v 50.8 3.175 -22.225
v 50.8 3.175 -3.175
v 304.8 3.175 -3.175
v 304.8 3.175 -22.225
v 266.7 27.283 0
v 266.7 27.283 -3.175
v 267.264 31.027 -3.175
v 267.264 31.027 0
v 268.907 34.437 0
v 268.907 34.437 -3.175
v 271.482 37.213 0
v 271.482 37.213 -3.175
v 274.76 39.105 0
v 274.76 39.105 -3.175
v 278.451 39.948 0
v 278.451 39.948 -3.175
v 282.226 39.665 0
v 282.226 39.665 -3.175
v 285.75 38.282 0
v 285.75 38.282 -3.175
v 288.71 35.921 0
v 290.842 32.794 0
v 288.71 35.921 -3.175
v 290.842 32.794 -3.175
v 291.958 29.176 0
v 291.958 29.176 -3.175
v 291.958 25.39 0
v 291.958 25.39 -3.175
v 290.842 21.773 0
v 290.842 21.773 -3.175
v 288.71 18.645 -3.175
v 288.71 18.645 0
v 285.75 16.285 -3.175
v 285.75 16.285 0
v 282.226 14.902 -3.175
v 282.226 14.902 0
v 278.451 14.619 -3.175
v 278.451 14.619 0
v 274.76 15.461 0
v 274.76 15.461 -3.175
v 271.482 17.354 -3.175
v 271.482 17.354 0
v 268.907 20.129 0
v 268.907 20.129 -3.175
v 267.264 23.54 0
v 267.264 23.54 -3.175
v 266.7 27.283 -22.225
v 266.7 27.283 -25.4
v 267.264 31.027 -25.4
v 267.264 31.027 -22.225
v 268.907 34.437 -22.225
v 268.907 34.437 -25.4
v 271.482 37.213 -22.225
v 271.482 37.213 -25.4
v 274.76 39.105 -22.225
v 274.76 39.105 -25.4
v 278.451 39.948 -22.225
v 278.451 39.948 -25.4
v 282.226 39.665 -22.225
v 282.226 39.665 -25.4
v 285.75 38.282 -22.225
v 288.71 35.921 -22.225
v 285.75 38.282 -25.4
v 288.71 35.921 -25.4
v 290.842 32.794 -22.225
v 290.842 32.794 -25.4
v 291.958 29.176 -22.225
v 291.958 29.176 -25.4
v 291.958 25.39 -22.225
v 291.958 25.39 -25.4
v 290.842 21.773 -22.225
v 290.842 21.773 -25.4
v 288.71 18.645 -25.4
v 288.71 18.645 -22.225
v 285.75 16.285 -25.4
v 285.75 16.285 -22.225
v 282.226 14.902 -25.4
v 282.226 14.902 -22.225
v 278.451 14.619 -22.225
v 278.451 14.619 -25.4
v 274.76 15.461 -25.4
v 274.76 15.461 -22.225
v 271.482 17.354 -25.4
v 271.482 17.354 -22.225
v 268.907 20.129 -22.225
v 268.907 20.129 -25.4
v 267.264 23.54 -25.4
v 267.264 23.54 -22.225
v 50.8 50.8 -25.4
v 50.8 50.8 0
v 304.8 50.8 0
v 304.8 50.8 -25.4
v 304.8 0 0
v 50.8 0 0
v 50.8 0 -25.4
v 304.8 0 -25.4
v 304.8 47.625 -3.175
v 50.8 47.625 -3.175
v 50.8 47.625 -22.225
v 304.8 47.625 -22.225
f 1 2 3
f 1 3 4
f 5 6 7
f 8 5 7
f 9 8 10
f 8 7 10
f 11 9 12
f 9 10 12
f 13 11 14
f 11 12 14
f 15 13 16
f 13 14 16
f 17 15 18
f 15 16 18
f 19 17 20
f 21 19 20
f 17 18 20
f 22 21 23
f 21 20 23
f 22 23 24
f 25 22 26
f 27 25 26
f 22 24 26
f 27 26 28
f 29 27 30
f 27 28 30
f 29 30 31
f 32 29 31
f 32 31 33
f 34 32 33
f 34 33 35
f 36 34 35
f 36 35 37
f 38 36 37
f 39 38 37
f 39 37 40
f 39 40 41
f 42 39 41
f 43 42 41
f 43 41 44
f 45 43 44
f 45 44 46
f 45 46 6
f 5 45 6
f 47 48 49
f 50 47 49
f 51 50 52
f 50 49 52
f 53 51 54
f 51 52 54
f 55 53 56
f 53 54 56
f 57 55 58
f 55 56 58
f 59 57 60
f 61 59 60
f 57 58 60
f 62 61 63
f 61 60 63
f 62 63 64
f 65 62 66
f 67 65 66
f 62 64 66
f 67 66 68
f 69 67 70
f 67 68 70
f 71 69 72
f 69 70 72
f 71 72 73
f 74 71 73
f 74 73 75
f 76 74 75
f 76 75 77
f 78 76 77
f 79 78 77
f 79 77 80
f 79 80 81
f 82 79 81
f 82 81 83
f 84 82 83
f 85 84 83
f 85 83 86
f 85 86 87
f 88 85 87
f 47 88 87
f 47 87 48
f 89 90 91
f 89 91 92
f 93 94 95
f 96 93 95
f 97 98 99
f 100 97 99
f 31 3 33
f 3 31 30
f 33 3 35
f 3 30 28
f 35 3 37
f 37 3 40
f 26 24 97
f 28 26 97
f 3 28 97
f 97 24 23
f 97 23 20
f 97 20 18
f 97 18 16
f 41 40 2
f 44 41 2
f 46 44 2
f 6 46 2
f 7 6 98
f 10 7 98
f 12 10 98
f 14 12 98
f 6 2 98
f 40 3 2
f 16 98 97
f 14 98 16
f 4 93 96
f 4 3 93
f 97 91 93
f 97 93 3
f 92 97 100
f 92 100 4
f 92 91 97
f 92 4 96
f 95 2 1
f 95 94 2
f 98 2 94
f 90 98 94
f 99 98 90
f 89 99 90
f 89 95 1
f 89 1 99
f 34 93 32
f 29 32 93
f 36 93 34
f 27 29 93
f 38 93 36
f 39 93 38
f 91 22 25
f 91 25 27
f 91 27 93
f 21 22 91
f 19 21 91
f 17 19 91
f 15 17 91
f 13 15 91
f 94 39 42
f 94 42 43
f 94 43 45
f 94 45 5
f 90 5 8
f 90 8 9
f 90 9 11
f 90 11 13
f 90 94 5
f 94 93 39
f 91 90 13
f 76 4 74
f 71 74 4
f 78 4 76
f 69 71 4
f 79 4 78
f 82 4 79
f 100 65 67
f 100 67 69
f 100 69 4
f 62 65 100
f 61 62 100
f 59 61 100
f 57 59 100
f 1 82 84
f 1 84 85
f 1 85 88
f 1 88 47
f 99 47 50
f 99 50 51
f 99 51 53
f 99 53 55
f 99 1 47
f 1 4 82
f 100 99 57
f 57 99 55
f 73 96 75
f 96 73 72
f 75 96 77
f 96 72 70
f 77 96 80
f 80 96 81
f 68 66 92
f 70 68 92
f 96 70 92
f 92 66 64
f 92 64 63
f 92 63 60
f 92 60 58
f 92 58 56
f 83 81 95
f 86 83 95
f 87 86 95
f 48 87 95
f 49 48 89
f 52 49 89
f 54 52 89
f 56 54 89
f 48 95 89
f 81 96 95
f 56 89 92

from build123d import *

# Parameters (mm, degrees)
SKETCH1_W               = 25.4
SKETCH1_H               = 50.8
SKETCH1_W_2             = 19.05
SKETCH1_H_2             = 44.45
BOSS_EXTRUDE1_DEPTH     = 304.8
SKETCH2_R               = 12.7
CUT_EXTRUDE1_DEPTH      = 1
CUT_EXTRUDE1_DEPTH_BACK = 26.4
SKETCH3_W               = 50.8
SKETCH3_H               = 55.112369071
CUT_EXTRUDE2_DEPTH      = 159.004


with BuildPart() as part:
    # Sketch1 → Boss-Extrude1 (new body)
    with BuildSketch(Plane(origin=(0, 0, 0), x_dir=(0, 0, -1), z_dir=(1, 0, 0))):
        with Locations((12.7, 25.4)):
            Rectangle(SKETCH1_W, SKETCH1_H)
        with Locations((12.7, 25.4)):
            Rectangle(SKETCH1_W_2, SKETCH1_H_2, mode=Mode.SUBTRACT)
    extrude(amount=BOSS_EXTRUDE1_DEPTH)

    # Sketch2 → Cut-Extrude1 (cut, two sides)
    with BuildSketch(Plane(origin=(0, 0, -25.4), x_dir=(-1, 0, 0), z_dir=(0, 0, -1))) as cut_extrude1_sk:
        with Locations((-279.4, 27.283270028)):
            Circle(SKETCH2_R)
    extrude(amount=CUT_EXTRUDE1_DEPTH, mode=Mode.SUBTRACT)
    extrude(cut_extrude1_sk.sketch, amount=-CUT_EXTRUDE1_DEPTH_BACK, mode=Mode.SUBTRACT)

    # Sketch3 → Cut-Extrude2 (cut)
    with BuildSketch(Plane(origin=(0, 0, -25.4), x_dir=(-1, 0, 0), z_dir=(0, 0, -1))):
        with Locations((-25.4, 23.243815465)):
            Rectangle(SKETCH3_W, SKETCH3_H)
    extrude(amount=-CUT_EXTRUDE2_DEPTH, mode=Mode.SUBTRACT)


solid = part.part
